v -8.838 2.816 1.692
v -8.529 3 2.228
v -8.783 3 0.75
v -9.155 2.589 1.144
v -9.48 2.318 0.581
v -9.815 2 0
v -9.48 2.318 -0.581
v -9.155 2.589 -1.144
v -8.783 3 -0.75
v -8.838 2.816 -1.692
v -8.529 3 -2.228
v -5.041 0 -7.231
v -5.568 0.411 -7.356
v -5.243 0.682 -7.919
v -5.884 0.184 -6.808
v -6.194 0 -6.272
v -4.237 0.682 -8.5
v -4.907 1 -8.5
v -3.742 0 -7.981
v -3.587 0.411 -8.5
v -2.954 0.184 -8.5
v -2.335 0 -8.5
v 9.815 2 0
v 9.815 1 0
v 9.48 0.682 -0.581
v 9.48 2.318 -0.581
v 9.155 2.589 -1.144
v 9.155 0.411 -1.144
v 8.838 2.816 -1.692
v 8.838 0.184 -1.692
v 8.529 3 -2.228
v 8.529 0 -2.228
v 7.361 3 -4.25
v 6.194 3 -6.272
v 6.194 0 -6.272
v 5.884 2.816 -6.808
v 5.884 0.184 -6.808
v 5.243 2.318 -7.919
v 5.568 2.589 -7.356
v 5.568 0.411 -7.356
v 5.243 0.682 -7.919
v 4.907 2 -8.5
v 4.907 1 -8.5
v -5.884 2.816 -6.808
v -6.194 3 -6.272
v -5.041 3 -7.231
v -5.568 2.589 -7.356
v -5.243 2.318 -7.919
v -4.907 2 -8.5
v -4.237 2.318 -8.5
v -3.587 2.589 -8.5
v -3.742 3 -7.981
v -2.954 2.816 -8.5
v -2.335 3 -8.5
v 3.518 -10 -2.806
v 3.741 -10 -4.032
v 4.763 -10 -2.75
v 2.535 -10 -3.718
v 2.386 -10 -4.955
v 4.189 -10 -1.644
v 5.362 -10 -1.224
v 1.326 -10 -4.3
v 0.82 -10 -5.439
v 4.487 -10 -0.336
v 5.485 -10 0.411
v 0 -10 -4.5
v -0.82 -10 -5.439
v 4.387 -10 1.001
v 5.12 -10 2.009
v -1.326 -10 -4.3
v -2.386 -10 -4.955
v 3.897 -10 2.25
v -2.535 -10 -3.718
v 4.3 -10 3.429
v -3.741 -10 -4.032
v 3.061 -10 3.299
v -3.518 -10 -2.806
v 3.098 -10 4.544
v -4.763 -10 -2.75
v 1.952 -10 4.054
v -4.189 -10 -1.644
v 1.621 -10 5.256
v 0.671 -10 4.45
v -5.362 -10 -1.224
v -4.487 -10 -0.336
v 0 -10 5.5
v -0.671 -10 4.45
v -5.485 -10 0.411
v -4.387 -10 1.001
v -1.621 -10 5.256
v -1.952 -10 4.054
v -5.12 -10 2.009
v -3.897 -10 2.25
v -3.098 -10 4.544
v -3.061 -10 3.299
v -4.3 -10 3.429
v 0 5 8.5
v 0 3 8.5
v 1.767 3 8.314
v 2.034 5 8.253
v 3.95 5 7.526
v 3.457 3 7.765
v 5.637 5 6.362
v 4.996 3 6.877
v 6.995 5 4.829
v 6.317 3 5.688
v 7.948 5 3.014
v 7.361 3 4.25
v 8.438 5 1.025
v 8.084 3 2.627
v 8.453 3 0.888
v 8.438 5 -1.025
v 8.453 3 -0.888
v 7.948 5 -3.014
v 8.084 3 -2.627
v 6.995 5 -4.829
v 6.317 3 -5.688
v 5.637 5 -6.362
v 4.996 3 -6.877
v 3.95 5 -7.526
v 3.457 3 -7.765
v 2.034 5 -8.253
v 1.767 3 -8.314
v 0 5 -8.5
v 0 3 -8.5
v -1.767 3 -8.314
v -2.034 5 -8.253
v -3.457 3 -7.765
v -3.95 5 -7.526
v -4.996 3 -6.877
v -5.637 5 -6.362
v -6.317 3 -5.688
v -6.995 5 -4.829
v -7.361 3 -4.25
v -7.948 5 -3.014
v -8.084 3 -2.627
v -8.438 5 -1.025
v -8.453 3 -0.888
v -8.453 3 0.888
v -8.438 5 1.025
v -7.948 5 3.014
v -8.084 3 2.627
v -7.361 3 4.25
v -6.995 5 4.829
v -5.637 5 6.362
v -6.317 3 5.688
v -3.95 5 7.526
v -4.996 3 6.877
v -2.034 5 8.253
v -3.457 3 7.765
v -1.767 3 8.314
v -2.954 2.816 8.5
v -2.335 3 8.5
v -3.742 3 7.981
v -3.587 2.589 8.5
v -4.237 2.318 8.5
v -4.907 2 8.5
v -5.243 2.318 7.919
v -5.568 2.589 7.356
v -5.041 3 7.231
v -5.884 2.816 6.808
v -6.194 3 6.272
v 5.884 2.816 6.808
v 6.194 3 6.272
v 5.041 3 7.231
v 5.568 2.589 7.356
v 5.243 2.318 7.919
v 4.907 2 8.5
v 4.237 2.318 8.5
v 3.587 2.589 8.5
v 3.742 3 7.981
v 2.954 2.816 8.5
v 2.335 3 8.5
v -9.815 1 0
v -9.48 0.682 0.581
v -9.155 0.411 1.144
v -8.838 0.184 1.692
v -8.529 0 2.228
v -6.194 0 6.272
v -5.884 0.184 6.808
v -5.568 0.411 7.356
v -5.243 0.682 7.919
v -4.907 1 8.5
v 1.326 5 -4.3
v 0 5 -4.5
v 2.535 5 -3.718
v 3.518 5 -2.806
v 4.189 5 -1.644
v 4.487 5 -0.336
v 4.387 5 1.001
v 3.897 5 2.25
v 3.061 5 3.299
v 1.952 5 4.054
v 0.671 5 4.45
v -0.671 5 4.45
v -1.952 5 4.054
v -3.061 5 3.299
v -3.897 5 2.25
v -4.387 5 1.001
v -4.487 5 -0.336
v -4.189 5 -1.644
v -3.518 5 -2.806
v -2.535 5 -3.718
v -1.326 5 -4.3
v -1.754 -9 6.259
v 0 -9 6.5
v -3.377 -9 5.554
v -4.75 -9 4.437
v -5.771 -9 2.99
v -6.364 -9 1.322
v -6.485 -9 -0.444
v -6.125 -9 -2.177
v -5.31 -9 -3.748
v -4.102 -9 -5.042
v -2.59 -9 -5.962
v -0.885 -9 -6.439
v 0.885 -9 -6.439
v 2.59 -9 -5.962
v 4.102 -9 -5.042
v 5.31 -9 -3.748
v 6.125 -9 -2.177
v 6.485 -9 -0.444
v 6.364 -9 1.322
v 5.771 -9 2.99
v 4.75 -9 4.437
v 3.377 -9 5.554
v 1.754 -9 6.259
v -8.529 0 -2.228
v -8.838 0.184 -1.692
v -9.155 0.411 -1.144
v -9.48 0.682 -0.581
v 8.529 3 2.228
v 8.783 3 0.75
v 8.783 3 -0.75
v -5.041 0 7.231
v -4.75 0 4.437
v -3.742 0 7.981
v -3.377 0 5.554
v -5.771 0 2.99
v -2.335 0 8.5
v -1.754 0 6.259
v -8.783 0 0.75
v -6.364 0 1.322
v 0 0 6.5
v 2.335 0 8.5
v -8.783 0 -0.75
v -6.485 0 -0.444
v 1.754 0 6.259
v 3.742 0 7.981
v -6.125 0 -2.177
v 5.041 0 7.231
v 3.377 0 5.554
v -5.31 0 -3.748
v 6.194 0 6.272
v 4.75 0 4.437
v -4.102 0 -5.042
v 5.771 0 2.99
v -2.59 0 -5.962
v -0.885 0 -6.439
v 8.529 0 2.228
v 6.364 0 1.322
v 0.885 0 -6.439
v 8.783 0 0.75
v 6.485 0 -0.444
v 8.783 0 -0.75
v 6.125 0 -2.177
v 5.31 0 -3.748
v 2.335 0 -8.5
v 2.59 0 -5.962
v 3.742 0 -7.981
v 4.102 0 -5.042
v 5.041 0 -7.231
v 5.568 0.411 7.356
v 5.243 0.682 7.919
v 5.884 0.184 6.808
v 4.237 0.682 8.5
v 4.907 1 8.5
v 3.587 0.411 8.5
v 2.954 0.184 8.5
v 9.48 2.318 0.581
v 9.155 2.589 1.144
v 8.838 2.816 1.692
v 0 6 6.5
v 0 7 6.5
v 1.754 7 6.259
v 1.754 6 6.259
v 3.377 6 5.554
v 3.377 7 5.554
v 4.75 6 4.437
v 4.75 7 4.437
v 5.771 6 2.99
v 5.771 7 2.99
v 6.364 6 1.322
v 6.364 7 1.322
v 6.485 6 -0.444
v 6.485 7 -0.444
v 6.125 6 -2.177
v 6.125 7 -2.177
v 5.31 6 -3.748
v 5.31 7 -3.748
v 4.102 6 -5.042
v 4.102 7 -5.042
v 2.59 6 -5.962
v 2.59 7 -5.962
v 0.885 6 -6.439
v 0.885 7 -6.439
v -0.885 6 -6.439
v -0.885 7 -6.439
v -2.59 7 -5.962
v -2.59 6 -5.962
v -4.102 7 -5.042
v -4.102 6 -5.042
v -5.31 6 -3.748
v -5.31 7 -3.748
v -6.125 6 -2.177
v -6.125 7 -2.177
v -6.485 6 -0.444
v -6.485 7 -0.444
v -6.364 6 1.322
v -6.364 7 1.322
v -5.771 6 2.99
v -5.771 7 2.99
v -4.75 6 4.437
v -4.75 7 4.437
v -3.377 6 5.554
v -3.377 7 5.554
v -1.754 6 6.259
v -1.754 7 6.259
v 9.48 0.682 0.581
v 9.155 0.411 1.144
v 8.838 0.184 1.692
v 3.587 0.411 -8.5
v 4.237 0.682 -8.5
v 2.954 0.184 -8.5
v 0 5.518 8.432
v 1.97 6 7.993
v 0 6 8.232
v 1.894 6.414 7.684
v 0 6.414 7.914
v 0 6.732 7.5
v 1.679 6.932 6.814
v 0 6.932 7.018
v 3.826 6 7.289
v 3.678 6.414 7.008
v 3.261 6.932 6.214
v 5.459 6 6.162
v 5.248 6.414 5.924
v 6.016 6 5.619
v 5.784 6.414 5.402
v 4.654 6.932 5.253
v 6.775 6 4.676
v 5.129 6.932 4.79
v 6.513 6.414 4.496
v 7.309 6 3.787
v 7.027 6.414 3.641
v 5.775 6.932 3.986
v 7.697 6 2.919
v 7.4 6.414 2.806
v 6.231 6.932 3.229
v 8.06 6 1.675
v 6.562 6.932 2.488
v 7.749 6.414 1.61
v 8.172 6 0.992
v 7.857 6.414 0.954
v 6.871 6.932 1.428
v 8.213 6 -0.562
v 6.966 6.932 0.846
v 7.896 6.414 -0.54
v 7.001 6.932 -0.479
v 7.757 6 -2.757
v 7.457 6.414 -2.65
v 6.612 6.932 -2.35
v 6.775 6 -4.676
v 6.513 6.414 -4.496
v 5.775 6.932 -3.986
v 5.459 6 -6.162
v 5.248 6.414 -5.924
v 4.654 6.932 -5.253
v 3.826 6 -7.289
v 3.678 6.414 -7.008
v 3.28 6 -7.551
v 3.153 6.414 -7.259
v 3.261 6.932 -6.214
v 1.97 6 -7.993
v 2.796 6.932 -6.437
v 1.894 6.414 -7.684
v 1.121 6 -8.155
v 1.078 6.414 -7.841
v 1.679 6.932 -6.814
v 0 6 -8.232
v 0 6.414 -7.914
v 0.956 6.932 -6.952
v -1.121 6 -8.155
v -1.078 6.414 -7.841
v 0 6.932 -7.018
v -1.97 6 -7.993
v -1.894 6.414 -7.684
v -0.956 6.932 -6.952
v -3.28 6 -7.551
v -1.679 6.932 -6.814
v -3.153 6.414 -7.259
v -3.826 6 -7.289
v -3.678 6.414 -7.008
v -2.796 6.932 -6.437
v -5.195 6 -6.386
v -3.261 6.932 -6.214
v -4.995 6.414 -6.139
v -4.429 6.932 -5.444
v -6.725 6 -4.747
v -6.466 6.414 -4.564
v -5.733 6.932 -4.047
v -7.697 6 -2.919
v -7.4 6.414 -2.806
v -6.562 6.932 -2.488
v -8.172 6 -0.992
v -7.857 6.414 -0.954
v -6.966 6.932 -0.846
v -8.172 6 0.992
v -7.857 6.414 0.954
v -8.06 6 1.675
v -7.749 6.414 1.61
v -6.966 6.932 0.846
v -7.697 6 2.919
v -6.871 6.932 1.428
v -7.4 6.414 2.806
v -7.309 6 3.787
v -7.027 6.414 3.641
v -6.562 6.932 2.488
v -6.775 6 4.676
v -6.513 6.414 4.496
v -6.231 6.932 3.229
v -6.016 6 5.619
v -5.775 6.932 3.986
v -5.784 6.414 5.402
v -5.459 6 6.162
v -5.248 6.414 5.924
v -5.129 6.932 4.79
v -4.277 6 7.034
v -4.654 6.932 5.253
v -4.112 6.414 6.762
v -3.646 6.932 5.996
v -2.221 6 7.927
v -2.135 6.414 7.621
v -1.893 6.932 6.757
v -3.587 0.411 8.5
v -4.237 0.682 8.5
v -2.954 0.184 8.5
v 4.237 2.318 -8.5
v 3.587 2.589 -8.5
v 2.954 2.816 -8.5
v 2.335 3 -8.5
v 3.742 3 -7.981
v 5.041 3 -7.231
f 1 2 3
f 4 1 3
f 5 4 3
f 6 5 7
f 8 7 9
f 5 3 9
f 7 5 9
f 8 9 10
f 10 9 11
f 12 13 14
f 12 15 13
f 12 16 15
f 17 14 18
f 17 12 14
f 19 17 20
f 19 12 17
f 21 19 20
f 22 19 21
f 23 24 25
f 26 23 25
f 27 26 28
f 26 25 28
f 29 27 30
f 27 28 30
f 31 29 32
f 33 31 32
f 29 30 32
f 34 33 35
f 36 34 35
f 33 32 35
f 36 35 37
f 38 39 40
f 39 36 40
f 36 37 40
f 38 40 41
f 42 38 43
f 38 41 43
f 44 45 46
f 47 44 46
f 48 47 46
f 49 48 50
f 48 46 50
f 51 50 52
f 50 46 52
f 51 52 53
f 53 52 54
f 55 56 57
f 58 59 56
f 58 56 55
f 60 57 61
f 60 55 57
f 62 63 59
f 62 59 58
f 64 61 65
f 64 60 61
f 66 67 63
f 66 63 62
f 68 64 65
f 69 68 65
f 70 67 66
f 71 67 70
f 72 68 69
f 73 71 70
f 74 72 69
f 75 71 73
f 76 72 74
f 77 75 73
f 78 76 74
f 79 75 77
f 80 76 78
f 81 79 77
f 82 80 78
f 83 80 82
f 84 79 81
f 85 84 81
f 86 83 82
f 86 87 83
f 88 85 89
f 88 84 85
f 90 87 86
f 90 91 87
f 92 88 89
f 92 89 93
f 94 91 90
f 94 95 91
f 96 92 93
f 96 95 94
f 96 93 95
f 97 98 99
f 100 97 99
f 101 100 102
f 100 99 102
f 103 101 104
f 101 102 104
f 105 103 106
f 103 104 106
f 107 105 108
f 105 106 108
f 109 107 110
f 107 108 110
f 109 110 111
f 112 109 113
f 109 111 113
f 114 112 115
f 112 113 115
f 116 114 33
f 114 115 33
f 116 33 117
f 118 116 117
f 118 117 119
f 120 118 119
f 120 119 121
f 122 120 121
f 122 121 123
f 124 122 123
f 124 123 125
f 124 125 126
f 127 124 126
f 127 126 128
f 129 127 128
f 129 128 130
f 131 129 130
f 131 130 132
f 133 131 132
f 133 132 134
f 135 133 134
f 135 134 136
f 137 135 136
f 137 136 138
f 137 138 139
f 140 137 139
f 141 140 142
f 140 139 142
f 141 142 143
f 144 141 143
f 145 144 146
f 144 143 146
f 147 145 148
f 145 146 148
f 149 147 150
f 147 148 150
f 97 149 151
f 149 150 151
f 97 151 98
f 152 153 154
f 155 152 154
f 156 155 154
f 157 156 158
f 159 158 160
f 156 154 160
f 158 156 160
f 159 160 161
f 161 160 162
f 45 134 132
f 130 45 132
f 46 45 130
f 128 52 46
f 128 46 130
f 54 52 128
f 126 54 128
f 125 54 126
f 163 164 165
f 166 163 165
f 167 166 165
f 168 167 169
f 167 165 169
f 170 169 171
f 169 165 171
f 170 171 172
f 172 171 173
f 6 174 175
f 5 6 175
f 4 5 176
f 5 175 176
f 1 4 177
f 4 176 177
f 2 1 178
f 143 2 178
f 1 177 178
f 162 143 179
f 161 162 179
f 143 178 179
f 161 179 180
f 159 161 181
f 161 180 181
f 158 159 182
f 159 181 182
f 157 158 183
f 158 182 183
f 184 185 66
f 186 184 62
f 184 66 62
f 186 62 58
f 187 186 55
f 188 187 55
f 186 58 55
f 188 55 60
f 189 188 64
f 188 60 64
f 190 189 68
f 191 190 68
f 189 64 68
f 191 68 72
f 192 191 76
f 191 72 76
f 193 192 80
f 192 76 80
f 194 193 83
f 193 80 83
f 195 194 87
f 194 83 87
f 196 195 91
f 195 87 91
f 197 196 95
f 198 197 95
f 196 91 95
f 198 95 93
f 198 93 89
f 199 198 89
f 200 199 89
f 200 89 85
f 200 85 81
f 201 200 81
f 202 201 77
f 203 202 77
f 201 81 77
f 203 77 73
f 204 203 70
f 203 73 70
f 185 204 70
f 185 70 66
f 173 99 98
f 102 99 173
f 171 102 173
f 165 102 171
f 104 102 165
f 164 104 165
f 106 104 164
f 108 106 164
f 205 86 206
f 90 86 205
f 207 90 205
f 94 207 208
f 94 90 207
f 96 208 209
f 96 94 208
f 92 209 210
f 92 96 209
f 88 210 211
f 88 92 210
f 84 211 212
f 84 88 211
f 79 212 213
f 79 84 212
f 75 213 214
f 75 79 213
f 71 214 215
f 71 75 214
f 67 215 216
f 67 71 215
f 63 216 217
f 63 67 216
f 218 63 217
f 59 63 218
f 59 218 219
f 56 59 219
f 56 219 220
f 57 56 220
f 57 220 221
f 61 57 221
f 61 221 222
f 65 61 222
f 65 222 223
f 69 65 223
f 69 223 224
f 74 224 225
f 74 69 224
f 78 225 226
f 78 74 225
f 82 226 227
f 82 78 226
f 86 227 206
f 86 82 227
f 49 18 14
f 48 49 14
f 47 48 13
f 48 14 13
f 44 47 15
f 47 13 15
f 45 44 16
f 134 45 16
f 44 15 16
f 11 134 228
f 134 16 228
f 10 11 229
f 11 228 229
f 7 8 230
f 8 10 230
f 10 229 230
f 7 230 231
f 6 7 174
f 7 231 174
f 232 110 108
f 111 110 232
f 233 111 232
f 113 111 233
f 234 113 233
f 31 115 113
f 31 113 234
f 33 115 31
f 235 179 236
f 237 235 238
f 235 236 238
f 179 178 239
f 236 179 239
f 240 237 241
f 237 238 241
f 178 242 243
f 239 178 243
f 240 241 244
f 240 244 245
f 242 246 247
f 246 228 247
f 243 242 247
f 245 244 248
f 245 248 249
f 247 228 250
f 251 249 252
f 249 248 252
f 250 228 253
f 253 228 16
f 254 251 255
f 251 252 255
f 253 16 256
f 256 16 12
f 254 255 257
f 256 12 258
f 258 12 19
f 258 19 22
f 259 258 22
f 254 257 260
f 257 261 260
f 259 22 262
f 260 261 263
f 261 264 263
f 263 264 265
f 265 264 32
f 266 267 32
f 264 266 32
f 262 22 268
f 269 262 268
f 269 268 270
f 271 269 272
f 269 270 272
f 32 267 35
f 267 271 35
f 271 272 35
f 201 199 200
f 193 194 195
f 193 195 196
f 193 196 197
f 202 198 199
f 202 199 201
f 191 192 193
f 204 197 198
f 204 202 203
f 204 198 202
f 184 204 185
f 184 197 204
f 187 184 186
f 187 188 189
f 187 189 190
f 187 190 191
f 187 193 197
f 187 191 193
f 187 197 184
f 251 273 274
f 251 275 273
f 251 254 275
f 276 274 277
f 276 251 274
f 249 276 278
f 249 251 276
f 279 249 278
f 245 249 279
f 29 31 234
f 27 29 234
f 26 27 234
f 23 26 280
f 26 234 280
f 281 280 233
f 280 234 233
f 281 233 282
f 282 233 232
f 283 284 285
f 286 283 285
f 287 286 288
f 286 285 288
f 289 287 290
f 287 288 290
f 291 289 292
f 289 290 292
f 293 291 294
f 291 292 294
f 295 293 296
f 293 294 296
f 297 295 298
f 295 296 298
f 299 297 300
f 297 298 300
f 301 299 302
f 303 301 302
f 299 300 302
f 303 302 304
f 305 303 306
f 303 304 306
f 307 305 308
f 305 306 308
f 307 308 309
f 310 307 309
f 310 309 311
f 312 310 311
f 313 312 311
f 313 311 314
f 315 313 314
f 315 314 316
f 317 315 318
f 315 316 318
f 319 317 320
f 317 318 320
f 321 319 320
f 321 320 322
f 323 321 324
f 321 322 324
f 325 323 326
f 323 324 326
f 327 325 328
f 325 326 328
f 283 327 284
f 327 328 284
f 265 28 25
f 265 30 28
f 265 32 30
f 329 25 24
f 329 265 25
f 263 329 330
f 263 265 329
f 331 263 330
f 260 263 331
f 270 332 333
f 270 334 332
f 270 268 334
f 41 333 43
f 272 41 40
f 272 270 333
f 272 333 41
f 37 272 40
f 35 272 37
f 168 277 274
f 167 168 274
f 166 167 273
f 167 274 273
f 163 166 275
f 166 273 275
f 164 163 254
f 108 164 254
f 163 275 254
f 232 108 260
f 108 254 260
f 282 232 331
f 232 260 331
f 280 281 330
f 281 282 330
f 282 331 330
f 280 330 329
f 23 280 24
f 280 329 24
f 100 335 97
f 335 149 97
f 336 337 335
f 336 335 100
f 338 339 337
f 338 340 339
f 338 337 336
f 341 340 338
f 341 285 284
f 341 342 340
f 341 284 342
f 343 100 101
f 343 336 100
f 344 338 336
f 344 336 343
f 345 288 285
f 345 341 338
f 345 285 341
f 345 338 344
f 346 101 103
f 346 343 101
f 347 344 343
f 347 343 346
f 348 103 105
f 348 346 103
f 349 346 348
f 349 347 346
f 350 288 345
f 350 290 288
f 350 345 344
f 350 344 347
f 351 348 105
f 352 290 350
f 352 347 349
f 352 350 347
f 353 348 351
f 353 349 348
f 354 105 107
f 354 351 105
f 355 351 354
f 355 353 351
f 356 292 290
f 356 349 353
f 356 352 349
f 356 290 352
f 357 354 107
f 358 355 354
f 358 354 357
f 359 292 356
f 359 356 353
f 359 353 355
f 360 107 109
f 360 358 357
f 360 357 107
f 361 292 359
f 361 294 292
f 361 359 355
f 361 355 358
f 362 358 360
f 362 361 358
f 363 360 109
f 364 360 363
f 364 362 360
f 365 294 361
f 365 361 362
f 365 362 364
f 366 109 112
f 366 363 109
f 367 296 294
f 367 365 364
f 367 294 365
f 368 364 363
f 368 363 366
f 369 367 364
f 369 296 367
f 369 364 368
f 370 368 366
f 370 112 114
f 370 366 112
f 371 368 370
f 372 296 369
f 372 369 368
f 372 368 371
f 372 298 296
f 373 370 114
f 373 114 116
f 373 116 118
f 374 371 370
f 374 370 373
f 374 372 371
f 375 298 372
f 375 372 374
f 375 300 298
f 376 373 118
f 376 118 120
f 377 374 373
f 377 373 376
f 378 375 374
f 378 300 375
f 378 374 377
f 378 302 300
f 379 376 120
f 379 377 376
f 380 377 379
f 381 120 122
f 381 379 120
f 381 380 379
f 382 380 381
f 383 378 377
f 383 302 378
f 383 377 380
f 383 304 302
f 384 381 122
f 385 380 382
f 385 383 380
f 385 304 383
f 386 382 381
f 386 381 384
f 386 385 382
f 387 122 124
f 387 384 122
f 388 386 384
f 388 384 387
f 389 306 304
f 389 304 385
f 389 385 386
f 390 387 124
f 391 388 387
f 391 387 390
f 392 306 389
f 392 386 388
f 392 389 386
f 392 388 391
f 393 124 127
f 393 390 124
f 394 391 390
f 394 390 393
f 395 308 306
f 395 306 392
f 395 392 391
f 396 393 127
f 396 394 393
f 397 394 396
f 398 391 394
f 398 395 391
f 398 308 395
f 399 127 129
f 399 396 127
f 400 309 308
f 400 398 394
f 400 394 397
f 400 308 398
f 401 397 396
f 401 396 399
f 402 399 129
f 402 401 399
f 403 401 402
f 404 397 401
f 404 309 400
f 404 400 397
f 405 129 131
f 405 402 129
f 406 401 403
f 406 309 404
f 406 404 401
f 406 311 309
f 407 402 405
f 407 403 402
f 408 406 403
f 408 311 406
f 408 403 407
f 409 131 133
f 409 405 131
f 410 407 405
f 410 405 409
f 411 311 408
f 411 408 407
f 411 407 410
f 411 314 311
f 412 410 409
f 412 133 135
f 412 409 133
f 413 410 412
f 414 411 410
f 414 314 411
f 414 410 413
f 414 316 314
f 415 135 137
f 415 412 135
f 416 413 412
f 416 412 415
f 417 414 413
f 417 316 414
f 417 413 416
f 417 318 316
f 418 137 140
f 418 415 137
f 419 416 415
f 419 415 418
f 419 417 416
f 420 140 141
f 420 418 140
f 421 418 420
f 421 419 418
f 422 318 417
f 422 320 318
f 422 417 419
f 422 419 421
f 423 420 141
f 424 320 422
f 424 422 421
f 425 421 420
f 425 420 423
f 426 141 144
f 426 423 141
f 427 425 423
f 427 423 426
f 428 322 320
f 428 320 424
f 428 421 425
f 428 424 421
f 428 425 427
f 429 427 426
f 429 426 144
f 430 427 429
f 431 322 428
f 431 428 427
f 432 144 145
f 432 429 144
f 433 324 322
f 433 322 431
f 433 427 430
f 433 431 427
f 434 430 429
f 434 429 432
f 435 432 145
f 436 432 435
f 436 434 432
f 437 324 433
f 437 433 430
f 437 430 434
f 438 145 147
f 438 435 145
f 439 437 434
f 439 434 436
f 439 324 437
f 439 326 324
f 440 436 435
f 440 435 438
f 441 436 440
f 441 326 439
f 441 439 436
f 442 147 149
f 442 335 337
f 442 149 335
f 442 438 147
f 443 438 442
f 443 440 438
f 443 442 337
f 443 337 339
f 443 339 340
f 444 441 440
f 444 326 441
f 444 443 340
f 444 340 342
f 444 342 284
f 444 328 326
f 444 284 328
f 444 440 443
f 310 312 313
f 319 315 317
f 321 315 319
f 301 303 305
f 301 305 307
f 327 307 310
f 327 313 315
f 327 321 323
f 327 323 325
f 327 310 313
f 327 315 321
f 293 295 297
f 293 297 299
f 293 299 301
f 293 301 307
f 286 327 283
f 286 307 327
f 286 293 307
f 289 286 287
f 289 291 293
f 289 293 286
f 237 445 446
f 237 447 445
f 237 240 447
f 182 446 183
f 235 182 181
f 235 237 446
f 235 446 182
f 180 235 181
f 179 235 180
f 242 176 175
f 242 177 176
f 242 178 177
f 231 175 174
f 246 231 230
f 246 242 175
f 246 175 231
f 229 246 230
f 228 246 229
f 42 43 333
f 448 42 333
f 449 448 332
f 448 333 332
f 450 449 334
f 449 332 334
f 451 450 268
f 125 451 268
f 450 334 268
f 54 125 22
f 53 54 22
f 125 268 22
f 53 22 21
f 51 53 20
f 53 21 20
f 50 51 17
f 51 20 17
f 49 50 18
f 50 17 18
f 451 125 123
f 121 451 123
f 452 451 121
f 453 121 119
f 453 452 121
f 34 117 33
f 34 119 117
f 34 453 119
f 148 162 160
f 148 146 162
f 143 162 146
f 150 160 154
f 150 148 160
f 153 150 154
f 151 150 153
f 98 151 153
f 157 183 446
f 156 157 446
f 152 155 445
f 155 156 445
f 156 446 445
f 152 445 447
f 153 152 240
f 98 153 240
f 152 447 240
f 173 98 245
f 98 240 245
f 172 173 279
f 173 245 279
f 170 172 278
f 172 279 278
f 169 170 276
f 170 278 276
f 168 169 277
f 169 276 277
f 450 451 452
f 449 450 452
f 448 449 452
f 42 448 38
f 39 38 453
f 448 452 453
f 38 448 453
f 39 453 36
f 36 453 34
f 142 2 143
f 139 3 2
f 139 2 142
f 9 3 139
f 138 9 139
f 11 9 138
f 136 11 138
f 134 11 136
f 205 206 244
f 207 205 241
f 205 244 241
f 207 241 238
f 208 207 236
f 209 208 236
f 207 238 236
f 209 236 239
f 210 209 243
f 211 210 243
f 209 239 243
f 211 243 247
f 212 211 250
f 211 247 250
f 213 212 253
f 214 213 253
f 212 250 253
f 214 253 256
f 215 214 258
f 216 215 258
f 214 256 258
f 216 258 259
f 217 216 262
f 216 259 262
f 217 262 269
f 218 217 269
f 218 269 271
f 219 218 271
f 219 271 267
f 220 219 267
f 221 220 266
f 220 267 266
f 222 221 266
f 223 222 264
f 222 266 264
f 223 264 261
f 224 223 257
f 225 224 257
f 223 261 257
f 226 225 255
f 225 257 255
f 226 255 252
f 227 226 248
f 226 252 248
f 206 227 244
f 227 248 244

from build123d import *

# Parameters (mm, degrees)
EXTRUDE_1_DEPTH     = 3
SKETCH_3_R          = 8.5
EXTRUDE_2_DEPTH     = 4
FILLET_1_R          = 2
SKETCH_4_R          = 6.5
CUT_EXTRUDE_1_DEPTH = 1
SKETCH_5_R          = 6.5
EXTRUDE_3_DEPTH     = 10
CHAMFER_1_SIZE      = 1
SKETCH_6_R          = 4.5
CUT_EXTRUDE_2_DEPTH = 15


with BuildPart() as part:
    # Эскиз1 → Бобышка-Вытянуть1 (new body)
    with BuildSketch(Plane(origin=(0, 0, 0), x_dir=(1, 0, 0), z_dir=(0, 1, 0))):
        Polygon((9.814954576, 0), (4.907477288, 8.5), (-4.907477288, 8.5), (-9.814954576, 0), (-4.907477288, -8.5), (4.907477288, -8.5), align=None)
    extrude(amount=EXTRUDE_1_DEPTH)

    # Эскиз2 → Вырез-Повернуть2 (revolve, cut)
    with BuildSketch(Plane.XY):
        Polygon((9.814954576, 1), (8.814954576, 0), (9.814954576, 0), align=None)
    cut_revolve_2 = revolve(axis=Axis((0, 10.488289755, 0), (0, -1, 0)), mode=Mode.SUBTRACT)

    # Зеркальное отражение1: Вырез-Повернуть2 across plane
    add(cut_revolve_2.mirror(Plane.ZX.offset(1.5)), mode=Mode.SUBTRACT)

    # Эскиз3 → Бобышка-Вытянуть2 (add)
    with BuildSketch(Plane(origin=(0, 3, 0), x_dir=(1, 0, 0), z_dir=(0, 1, 0))):
        with Locations(Location((0, 0, 0), (0, 0, 270))):
            Circle(SKETCH_3_R)
    extrude(amount=EXTRUDE_2_DEPTH)

    # Скругление1
    fillet_1_edges = [part.edges().sort_by_distance(p)[0] for p in [
        (0, 7, -8.5),
    ]]
    fillet(fillet_1_edges, radius=FILLET_1_R)

    # Эскиз4 → Вырез-Вытянуть1 (cut)
    with BuildSketch(Plane(origin=(0, 7, 0), x_dir=(1, 0, 0), z_dir=(0, 1, 0))):
        with Locations(Location((0, 0, 0), (0, 0, 270))):
            Circle(SKETCH_4_R)
    extrude(amount=-CUT_EXTRUDE_1_DEPTH, mode=Mode.SUBTRACT)

    # Эскиз5 → Бобышка-Вытянуть3 (add)
    with BuildSketch(Plane.XZ):
        with Locations(Location((0, 0, 0), (0, 0, 90))):
            Circle(SKETCH_5_R)
    extrude(amount=EXTRUDE_3_DEPTH)

    # Фаска1
    chamfer_1_edges = [part.edges().sort_by_distance(p)[0] for p in [
        (0, -10, -6.5),
    ]]
    chamfer(chamfer_1_edges, length=CHAMFER_1_SIZE)

    # Эскиз6 → Вырез-Вытянуть2 (cut)
    with BuildSketch(Plane.XZ.offset(10)):
        with Locations(Location((0, 0, 0), (0, 0, 270))):
            Circle(SKETCH_6_R)
    extrude(amount=-CUT_EXTRUDE_2_DEPTH, mode=Mode.SUBTRACT)


solid = part.part
